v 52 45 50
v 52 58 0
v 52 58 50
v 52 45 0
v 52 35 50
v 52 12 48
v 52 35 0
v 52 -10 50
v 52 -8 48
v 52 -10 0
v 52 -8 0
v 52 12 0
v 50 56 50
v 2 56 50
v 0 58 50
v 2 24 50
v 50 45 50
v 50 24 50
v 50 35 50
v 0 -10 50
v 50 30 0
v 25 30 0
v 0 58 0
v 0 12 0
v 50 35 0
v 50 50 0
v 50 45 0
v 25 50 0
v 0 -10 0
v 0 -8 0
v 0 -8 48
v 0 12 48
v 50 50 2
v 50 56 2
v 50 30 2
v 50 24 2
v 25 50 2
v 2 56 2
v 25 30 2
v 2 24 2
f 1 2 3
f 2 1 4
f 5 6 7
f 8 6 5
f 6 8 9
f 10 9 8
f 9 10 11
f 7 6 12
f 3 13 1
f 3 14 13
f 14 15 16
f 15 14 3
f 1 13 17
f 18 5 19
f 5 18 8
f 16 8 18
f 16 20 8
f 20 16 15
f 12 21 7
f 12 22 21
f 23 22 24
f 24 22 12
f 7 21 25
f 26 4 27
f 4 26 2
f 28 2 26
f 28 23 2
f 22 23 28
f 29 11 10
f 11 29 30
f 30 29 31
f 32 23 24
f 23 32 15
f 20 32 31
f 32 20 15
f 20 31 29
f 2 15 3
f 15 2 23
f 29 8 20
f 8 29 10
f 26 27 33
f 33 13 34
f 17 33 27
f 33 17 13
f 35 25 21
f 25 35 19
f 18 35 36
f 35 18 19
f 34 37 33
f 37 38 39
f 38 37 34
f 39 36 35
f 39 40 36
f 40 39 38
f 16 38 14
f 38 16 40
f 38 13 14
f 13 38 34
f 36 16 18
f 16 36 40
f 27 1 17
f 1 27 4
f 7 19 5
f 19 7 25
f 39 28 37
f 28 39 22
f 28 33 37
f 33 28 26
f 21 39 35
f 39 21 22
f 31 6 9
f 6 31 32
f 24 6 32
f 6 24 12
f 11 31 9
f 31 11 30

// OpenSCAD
difference(){
    
    translate([ 0,-10,0])cube([52,68,50]);
    translate([ 2,24, 2])cube([48,32,50]);  //Netzteil
    translate([50,35,-5])cube([10,10,60]);  //Kabelschacht
    translate([25,30,-5])cube([25,20,20]);  //Steckerloch
    translate([ 0,-8, 0])cube([60,20,48]);  //Tisch
    
}
